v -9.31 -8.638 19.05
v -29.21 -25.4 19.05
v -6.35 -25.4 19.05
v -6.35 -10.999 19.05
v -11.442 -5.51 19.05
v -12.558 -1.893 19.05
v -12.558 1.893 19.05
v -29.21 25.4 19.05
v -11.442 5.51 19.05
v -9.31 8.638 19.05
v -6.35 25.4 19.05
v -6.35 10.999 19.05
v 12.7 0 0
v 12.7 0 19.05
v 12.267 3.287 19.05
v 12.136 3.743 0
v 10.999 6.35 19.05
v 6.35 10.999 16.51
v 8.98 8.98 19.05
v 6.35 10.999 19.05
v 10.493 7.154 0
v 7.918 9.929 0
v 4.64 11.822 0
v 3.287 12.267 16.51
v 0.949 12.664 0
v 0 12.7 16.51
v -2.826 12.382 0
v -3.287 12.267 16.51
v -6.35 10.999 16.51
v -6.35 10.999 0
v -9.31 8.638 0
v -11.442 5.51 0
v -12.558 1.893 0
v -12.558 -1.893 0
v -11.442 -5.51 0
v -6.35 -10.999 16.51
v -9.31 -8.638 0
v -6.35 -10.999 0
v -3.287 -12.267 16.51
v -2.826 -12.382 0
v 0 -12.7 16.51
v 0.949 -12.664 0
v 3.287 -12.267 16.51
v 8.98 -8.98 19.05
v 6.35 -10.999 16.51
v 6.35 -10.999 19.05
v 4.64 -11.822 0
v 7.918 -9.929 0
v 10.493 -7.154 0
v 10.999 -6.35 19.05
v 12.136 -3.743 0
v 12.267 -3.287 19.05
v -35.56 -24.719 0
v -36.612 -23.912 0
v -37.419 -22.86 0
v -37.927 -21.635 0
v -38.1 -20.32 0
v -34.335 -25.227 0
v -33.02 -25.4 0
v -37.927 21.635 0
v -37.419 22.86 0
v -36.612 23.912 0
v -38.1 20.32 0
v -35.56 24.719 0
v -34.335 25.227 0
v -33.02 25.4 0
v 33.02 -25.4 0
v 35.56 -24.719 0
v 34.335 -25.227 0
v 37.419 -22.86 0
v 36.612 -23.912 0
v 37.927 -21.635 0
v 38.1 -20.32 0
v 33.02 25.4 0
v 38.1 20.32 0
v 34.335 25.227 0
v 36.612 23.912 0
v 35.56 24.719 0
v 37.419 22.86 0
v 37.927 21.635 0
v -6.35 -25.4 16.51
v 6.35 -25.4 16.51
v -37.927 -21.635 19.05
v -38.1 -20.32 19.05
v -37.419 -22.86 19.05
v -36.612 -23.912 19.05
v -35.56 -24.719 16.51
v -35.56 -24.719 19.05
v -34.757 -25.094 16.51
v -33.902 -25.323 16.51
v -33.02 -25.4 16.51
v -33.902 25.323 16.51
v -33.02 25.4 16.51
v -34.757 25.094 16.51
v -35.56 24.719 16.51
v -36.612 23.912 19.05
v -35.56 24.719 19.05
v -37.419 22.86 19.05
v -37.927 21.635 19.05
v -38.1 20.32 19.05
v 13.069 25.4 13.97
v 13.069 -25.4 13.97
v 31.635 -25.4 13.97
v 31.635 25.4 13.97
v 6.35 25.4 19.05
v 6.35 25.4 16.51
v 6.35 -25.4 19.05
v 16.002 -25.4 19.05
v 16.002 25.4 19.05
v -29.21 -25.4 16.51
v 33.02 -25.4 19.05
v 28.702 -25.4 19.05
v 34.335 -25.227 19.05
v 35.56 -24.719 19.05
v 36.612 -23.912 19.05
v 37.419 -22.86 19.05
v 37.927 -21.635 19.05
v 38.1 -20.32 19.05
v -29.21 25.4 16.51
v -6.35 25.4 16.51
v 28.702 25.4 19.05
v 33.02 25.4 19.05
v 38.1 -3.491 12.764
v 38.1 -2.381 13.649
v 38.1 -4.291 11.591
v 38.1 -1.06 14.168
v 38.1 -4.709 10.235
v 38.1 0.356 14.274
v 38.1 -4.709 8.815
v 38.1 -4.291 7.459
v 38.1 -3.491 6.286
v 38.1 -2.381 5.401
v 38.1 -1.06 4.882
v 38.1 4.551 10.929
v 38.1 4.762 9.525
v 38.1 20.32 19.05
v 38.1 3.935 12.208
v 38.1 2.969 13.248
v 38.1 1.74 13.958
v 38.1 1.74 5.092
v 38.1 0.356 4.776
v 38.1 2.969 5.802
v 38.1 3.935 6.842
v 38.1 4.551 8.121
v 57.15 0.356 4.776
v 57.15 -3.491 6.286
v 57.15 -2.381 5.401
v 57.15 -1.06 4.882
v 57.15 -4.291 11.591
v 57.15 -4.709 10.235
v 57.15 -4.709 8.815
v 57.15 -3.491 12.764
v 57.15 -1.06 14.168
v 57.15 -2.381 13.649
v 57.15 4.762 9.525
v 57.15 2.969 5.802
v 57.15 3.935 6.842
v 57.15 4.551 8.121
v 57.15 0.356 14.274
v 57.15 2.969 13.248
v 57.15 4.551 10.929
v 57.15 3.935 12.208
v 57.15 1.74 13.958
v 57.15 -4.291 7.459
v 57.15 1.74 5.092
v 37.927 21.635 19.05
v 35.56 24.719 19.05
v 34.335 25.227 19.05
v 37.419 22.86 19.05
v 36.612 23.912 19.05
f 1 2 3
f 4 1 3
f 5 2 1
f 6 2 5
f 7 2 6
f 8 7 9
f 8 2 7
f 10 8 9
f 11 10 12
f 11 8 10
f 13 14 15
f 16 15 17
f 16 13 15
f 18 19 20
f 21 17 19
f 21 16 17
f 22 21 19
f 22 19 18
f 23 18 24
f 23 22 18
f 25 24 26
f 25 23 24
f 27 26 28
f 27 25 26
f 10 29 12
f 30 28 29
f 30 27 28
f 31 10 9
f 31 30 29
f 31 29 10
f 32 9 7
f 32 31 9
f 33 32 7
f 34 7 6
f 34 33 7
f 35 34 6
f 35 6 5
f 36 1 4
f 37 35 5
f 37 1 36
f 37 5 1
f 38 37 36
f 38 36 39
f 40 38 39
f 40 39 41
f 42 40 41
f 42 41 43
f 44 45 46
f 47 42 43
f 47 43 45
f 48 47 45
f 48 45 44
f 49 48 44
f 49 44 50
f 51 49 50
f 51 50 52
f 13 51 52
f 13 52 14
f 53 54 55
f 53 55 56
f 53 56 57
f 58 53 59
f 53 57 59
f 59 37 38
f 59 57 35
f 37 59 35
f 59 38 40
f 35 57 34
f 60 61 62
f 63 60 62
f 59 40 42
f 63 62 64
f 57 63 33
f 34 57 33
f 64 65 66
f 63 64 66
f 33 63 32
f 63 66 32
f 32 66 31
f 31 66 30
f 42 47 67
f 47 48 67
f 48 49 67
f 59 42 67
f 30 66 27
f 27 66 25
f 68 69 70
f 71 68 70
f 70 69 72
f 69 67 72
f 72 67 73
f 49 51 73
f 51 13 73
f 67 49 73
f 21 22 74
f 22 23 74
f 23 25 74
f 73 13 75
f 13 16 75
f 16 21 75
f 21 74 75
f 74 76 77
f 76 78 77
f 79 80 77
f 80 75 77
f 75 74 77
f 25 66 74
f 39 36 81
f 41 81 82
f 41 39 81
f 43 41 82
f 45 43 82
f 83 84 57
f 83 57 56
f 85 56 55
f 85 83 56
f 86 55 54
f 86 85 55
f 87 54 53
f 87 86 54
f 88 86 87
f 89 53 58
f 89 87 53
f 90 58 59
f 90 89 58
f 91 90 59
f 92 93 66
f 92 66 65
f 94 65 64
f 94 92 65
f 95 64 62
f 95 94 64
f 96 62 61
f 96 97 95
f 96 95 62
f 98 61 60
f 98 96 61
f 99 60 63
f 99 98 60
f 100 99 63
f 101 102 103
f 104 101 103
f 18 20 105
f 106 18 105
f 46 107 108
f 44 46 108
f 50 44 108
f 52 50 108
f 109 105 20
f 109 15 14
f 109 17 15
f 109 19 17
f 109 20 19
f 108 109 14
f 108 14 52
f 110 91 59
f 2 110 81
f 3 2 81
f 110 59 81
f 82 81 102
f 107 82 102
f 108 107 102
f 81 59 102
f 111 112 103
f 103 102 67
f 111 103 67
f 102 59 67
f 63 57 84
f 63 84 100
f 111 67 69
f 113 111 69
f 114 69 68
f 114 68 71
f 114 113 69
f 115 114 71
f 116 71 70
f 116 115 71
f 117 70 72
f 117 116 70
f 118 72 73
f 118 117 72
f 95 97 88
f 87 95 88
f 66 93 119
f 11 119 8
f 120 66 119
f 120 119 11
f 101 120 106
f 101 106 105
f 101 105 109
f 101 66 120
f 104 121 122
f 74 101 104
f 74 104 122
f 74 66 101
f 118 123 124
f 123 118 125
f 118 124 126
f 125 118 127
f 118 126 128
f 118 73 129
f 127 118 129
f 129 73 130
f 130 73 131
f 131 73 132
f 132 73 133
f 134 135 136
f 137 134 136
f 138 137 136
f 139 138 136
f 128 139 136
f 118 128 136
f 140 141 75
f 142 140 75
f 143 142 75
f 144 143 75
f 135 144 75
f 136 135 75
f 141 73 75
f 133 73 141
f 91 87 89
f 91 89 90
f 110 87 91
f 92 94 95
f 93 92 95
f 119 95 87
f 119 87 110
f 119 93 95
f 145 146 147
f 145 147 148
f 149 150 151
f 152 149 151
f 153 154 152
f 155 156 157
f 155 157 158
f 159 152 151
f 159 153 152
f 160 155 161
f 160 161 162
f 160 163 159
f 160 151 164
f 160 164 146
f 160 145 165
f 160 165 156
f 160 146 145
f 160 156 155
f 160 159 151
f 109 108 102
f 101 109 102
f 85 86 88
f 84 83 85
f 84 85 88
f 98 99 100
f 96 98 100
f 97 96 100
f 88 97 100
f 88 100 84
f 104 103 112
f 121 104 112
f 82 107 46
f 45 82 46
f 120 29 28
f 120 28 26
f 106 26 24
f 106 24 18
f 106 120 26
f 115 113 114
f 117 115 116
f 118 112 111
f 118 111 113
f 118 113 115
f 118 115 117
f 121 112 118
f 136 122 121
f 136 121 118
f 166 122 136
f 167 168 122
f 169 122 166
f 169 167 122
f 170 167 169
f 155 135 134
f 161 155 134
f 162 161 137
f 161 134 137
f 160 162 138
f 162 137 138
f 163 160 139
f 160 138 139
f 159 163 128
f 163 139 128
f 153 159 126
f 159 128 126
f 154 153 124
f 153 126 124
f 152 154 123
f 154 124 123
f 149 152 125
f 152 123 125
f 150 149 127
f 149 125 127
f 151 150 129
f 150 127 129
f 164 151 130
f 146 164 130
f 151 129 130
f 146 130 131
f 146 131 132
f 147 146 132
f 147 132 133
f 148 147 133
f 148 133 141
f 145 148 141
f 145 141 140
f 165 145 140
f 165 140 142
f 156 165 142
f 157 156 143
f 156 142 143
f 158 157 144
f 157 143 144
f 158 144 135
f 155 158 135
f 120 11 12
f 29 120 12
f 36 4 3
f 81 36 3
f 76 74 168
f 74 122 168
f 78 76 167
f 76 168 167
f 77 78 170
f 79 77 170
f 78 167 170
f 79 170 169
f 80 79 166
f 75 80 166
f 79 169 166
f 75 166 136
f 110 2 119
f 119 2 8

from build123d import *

# Parameters (mm, degrees)
F0_W      = 76.2
F0_H      = 50.8
F0_R      = 12.7
F1_DEPTH  = 19.05
F2_R      = 5.08
F3_R      = 5.08
F4_R      = 5.08
F6_DEPTH  = 2.54
F7_R      = 4.7625
F8_DEPTH  = 19.05
F10_DEPTH = 50.801


with BuildPart() as f1:
    # F0 (on Top) → F1 (new body)
    with BuildSketch(Plane.XY):
        Rectangle(F0_W, F0_H)
        Circle(F0_R, mode=Mode.SUBTRACT)
    extrude(amount=F1_DEPTH)

    # F2
    f2_edges = [f1.edges().sort_by_distance(p)[0] for p in [
        (-38.1, -25.4, 9.525),
    ]]
    fillet(f2_edges, radius=F2_R)

    # F3
    f3_edges = [f1.edges().sort_by_distance(p)[0] for p in [
        (38.1, -25.4, 9.525),
        (38.1, 25.4, 9.525),
    ]]
    fillet(f3_edges, radius=F3_R)

    # F4
    f4_edges = [f1.edges().sort_by_distance(p)[0] for p in [
        (-38.1, 25.4, 9.525),
    ]]
    fillet(f4_edges, radius=F4_R)

    # F5 (on face) → F6 (cut)
    with BuildSketch(Plane.XY.offset(19.05)):
        with BuildLine():
            Line((-29.21, 25.4), (-33.02, 25.4))
            ThreePointArc((-33.02, 25.4), (-34.3348007491, 25.2269031975), (-35.56, 24.7194090512))
            Line((-35.56, 24.7194090512), (-35.56, -24.7194090512))
            ThreePointArc((-35.56, -24.7194090512), (-34.3348007491, -25.2269031975), (-33.02, -25.4))
            Line((-33.02, -25.4), (-29.21, -25.4))
            Line((-29.21, -25.4), (-29.21, 25.4))
        make_face()
        with BuildLine():
            Line((-6.35, -10.9985226281), (-6.35, -25.4))
            Line((-6.35, -25.4), (6.35, -25.4))
            Line((6.35, -25.4), (6.35, -10.9985226281))
            ThreePointArc((6.35, -10.9985226281), (0, -12.7), (-6.35, -10.9985226281))
        make_face()
        with BuildLine():
            Line((6.35, 25.4), (-6.35, 25.4))
            Line((-6.35, 25.4), (-6.35, 10.9985226281))
            ThreePointArc((-6.35, 10.9985226281), (0, 12.7), (6.35, 10.9985226281))
            Line((6.35, 10.9985226281), (6.35, 25.4))
        make_face()
    extrude(amount=-F6_DEPTH, mode=Mode.SUBTRACT)

    # F7 (on face) → F8 (join)
    with BuildSketch(Plane.YZ.offset(38.1)):
        with Locations((0, 9.525)):
            Circle(F7_R)
    extrude(amount=F8_DEPTH)

    # F9 (on face) → F10 (cut, through all)
    with BuildSketch(Plane.XZ.offset(25.4)):
        Polygon((28.702, 19.05), (16.002, 19.05), (13.0690606325, 13.97), (31.6349393675, 13.97), align=None)
    extrude(amount=-F10_DEPTH, mode=Mode.SUBTRACT)


solid = f1.part
